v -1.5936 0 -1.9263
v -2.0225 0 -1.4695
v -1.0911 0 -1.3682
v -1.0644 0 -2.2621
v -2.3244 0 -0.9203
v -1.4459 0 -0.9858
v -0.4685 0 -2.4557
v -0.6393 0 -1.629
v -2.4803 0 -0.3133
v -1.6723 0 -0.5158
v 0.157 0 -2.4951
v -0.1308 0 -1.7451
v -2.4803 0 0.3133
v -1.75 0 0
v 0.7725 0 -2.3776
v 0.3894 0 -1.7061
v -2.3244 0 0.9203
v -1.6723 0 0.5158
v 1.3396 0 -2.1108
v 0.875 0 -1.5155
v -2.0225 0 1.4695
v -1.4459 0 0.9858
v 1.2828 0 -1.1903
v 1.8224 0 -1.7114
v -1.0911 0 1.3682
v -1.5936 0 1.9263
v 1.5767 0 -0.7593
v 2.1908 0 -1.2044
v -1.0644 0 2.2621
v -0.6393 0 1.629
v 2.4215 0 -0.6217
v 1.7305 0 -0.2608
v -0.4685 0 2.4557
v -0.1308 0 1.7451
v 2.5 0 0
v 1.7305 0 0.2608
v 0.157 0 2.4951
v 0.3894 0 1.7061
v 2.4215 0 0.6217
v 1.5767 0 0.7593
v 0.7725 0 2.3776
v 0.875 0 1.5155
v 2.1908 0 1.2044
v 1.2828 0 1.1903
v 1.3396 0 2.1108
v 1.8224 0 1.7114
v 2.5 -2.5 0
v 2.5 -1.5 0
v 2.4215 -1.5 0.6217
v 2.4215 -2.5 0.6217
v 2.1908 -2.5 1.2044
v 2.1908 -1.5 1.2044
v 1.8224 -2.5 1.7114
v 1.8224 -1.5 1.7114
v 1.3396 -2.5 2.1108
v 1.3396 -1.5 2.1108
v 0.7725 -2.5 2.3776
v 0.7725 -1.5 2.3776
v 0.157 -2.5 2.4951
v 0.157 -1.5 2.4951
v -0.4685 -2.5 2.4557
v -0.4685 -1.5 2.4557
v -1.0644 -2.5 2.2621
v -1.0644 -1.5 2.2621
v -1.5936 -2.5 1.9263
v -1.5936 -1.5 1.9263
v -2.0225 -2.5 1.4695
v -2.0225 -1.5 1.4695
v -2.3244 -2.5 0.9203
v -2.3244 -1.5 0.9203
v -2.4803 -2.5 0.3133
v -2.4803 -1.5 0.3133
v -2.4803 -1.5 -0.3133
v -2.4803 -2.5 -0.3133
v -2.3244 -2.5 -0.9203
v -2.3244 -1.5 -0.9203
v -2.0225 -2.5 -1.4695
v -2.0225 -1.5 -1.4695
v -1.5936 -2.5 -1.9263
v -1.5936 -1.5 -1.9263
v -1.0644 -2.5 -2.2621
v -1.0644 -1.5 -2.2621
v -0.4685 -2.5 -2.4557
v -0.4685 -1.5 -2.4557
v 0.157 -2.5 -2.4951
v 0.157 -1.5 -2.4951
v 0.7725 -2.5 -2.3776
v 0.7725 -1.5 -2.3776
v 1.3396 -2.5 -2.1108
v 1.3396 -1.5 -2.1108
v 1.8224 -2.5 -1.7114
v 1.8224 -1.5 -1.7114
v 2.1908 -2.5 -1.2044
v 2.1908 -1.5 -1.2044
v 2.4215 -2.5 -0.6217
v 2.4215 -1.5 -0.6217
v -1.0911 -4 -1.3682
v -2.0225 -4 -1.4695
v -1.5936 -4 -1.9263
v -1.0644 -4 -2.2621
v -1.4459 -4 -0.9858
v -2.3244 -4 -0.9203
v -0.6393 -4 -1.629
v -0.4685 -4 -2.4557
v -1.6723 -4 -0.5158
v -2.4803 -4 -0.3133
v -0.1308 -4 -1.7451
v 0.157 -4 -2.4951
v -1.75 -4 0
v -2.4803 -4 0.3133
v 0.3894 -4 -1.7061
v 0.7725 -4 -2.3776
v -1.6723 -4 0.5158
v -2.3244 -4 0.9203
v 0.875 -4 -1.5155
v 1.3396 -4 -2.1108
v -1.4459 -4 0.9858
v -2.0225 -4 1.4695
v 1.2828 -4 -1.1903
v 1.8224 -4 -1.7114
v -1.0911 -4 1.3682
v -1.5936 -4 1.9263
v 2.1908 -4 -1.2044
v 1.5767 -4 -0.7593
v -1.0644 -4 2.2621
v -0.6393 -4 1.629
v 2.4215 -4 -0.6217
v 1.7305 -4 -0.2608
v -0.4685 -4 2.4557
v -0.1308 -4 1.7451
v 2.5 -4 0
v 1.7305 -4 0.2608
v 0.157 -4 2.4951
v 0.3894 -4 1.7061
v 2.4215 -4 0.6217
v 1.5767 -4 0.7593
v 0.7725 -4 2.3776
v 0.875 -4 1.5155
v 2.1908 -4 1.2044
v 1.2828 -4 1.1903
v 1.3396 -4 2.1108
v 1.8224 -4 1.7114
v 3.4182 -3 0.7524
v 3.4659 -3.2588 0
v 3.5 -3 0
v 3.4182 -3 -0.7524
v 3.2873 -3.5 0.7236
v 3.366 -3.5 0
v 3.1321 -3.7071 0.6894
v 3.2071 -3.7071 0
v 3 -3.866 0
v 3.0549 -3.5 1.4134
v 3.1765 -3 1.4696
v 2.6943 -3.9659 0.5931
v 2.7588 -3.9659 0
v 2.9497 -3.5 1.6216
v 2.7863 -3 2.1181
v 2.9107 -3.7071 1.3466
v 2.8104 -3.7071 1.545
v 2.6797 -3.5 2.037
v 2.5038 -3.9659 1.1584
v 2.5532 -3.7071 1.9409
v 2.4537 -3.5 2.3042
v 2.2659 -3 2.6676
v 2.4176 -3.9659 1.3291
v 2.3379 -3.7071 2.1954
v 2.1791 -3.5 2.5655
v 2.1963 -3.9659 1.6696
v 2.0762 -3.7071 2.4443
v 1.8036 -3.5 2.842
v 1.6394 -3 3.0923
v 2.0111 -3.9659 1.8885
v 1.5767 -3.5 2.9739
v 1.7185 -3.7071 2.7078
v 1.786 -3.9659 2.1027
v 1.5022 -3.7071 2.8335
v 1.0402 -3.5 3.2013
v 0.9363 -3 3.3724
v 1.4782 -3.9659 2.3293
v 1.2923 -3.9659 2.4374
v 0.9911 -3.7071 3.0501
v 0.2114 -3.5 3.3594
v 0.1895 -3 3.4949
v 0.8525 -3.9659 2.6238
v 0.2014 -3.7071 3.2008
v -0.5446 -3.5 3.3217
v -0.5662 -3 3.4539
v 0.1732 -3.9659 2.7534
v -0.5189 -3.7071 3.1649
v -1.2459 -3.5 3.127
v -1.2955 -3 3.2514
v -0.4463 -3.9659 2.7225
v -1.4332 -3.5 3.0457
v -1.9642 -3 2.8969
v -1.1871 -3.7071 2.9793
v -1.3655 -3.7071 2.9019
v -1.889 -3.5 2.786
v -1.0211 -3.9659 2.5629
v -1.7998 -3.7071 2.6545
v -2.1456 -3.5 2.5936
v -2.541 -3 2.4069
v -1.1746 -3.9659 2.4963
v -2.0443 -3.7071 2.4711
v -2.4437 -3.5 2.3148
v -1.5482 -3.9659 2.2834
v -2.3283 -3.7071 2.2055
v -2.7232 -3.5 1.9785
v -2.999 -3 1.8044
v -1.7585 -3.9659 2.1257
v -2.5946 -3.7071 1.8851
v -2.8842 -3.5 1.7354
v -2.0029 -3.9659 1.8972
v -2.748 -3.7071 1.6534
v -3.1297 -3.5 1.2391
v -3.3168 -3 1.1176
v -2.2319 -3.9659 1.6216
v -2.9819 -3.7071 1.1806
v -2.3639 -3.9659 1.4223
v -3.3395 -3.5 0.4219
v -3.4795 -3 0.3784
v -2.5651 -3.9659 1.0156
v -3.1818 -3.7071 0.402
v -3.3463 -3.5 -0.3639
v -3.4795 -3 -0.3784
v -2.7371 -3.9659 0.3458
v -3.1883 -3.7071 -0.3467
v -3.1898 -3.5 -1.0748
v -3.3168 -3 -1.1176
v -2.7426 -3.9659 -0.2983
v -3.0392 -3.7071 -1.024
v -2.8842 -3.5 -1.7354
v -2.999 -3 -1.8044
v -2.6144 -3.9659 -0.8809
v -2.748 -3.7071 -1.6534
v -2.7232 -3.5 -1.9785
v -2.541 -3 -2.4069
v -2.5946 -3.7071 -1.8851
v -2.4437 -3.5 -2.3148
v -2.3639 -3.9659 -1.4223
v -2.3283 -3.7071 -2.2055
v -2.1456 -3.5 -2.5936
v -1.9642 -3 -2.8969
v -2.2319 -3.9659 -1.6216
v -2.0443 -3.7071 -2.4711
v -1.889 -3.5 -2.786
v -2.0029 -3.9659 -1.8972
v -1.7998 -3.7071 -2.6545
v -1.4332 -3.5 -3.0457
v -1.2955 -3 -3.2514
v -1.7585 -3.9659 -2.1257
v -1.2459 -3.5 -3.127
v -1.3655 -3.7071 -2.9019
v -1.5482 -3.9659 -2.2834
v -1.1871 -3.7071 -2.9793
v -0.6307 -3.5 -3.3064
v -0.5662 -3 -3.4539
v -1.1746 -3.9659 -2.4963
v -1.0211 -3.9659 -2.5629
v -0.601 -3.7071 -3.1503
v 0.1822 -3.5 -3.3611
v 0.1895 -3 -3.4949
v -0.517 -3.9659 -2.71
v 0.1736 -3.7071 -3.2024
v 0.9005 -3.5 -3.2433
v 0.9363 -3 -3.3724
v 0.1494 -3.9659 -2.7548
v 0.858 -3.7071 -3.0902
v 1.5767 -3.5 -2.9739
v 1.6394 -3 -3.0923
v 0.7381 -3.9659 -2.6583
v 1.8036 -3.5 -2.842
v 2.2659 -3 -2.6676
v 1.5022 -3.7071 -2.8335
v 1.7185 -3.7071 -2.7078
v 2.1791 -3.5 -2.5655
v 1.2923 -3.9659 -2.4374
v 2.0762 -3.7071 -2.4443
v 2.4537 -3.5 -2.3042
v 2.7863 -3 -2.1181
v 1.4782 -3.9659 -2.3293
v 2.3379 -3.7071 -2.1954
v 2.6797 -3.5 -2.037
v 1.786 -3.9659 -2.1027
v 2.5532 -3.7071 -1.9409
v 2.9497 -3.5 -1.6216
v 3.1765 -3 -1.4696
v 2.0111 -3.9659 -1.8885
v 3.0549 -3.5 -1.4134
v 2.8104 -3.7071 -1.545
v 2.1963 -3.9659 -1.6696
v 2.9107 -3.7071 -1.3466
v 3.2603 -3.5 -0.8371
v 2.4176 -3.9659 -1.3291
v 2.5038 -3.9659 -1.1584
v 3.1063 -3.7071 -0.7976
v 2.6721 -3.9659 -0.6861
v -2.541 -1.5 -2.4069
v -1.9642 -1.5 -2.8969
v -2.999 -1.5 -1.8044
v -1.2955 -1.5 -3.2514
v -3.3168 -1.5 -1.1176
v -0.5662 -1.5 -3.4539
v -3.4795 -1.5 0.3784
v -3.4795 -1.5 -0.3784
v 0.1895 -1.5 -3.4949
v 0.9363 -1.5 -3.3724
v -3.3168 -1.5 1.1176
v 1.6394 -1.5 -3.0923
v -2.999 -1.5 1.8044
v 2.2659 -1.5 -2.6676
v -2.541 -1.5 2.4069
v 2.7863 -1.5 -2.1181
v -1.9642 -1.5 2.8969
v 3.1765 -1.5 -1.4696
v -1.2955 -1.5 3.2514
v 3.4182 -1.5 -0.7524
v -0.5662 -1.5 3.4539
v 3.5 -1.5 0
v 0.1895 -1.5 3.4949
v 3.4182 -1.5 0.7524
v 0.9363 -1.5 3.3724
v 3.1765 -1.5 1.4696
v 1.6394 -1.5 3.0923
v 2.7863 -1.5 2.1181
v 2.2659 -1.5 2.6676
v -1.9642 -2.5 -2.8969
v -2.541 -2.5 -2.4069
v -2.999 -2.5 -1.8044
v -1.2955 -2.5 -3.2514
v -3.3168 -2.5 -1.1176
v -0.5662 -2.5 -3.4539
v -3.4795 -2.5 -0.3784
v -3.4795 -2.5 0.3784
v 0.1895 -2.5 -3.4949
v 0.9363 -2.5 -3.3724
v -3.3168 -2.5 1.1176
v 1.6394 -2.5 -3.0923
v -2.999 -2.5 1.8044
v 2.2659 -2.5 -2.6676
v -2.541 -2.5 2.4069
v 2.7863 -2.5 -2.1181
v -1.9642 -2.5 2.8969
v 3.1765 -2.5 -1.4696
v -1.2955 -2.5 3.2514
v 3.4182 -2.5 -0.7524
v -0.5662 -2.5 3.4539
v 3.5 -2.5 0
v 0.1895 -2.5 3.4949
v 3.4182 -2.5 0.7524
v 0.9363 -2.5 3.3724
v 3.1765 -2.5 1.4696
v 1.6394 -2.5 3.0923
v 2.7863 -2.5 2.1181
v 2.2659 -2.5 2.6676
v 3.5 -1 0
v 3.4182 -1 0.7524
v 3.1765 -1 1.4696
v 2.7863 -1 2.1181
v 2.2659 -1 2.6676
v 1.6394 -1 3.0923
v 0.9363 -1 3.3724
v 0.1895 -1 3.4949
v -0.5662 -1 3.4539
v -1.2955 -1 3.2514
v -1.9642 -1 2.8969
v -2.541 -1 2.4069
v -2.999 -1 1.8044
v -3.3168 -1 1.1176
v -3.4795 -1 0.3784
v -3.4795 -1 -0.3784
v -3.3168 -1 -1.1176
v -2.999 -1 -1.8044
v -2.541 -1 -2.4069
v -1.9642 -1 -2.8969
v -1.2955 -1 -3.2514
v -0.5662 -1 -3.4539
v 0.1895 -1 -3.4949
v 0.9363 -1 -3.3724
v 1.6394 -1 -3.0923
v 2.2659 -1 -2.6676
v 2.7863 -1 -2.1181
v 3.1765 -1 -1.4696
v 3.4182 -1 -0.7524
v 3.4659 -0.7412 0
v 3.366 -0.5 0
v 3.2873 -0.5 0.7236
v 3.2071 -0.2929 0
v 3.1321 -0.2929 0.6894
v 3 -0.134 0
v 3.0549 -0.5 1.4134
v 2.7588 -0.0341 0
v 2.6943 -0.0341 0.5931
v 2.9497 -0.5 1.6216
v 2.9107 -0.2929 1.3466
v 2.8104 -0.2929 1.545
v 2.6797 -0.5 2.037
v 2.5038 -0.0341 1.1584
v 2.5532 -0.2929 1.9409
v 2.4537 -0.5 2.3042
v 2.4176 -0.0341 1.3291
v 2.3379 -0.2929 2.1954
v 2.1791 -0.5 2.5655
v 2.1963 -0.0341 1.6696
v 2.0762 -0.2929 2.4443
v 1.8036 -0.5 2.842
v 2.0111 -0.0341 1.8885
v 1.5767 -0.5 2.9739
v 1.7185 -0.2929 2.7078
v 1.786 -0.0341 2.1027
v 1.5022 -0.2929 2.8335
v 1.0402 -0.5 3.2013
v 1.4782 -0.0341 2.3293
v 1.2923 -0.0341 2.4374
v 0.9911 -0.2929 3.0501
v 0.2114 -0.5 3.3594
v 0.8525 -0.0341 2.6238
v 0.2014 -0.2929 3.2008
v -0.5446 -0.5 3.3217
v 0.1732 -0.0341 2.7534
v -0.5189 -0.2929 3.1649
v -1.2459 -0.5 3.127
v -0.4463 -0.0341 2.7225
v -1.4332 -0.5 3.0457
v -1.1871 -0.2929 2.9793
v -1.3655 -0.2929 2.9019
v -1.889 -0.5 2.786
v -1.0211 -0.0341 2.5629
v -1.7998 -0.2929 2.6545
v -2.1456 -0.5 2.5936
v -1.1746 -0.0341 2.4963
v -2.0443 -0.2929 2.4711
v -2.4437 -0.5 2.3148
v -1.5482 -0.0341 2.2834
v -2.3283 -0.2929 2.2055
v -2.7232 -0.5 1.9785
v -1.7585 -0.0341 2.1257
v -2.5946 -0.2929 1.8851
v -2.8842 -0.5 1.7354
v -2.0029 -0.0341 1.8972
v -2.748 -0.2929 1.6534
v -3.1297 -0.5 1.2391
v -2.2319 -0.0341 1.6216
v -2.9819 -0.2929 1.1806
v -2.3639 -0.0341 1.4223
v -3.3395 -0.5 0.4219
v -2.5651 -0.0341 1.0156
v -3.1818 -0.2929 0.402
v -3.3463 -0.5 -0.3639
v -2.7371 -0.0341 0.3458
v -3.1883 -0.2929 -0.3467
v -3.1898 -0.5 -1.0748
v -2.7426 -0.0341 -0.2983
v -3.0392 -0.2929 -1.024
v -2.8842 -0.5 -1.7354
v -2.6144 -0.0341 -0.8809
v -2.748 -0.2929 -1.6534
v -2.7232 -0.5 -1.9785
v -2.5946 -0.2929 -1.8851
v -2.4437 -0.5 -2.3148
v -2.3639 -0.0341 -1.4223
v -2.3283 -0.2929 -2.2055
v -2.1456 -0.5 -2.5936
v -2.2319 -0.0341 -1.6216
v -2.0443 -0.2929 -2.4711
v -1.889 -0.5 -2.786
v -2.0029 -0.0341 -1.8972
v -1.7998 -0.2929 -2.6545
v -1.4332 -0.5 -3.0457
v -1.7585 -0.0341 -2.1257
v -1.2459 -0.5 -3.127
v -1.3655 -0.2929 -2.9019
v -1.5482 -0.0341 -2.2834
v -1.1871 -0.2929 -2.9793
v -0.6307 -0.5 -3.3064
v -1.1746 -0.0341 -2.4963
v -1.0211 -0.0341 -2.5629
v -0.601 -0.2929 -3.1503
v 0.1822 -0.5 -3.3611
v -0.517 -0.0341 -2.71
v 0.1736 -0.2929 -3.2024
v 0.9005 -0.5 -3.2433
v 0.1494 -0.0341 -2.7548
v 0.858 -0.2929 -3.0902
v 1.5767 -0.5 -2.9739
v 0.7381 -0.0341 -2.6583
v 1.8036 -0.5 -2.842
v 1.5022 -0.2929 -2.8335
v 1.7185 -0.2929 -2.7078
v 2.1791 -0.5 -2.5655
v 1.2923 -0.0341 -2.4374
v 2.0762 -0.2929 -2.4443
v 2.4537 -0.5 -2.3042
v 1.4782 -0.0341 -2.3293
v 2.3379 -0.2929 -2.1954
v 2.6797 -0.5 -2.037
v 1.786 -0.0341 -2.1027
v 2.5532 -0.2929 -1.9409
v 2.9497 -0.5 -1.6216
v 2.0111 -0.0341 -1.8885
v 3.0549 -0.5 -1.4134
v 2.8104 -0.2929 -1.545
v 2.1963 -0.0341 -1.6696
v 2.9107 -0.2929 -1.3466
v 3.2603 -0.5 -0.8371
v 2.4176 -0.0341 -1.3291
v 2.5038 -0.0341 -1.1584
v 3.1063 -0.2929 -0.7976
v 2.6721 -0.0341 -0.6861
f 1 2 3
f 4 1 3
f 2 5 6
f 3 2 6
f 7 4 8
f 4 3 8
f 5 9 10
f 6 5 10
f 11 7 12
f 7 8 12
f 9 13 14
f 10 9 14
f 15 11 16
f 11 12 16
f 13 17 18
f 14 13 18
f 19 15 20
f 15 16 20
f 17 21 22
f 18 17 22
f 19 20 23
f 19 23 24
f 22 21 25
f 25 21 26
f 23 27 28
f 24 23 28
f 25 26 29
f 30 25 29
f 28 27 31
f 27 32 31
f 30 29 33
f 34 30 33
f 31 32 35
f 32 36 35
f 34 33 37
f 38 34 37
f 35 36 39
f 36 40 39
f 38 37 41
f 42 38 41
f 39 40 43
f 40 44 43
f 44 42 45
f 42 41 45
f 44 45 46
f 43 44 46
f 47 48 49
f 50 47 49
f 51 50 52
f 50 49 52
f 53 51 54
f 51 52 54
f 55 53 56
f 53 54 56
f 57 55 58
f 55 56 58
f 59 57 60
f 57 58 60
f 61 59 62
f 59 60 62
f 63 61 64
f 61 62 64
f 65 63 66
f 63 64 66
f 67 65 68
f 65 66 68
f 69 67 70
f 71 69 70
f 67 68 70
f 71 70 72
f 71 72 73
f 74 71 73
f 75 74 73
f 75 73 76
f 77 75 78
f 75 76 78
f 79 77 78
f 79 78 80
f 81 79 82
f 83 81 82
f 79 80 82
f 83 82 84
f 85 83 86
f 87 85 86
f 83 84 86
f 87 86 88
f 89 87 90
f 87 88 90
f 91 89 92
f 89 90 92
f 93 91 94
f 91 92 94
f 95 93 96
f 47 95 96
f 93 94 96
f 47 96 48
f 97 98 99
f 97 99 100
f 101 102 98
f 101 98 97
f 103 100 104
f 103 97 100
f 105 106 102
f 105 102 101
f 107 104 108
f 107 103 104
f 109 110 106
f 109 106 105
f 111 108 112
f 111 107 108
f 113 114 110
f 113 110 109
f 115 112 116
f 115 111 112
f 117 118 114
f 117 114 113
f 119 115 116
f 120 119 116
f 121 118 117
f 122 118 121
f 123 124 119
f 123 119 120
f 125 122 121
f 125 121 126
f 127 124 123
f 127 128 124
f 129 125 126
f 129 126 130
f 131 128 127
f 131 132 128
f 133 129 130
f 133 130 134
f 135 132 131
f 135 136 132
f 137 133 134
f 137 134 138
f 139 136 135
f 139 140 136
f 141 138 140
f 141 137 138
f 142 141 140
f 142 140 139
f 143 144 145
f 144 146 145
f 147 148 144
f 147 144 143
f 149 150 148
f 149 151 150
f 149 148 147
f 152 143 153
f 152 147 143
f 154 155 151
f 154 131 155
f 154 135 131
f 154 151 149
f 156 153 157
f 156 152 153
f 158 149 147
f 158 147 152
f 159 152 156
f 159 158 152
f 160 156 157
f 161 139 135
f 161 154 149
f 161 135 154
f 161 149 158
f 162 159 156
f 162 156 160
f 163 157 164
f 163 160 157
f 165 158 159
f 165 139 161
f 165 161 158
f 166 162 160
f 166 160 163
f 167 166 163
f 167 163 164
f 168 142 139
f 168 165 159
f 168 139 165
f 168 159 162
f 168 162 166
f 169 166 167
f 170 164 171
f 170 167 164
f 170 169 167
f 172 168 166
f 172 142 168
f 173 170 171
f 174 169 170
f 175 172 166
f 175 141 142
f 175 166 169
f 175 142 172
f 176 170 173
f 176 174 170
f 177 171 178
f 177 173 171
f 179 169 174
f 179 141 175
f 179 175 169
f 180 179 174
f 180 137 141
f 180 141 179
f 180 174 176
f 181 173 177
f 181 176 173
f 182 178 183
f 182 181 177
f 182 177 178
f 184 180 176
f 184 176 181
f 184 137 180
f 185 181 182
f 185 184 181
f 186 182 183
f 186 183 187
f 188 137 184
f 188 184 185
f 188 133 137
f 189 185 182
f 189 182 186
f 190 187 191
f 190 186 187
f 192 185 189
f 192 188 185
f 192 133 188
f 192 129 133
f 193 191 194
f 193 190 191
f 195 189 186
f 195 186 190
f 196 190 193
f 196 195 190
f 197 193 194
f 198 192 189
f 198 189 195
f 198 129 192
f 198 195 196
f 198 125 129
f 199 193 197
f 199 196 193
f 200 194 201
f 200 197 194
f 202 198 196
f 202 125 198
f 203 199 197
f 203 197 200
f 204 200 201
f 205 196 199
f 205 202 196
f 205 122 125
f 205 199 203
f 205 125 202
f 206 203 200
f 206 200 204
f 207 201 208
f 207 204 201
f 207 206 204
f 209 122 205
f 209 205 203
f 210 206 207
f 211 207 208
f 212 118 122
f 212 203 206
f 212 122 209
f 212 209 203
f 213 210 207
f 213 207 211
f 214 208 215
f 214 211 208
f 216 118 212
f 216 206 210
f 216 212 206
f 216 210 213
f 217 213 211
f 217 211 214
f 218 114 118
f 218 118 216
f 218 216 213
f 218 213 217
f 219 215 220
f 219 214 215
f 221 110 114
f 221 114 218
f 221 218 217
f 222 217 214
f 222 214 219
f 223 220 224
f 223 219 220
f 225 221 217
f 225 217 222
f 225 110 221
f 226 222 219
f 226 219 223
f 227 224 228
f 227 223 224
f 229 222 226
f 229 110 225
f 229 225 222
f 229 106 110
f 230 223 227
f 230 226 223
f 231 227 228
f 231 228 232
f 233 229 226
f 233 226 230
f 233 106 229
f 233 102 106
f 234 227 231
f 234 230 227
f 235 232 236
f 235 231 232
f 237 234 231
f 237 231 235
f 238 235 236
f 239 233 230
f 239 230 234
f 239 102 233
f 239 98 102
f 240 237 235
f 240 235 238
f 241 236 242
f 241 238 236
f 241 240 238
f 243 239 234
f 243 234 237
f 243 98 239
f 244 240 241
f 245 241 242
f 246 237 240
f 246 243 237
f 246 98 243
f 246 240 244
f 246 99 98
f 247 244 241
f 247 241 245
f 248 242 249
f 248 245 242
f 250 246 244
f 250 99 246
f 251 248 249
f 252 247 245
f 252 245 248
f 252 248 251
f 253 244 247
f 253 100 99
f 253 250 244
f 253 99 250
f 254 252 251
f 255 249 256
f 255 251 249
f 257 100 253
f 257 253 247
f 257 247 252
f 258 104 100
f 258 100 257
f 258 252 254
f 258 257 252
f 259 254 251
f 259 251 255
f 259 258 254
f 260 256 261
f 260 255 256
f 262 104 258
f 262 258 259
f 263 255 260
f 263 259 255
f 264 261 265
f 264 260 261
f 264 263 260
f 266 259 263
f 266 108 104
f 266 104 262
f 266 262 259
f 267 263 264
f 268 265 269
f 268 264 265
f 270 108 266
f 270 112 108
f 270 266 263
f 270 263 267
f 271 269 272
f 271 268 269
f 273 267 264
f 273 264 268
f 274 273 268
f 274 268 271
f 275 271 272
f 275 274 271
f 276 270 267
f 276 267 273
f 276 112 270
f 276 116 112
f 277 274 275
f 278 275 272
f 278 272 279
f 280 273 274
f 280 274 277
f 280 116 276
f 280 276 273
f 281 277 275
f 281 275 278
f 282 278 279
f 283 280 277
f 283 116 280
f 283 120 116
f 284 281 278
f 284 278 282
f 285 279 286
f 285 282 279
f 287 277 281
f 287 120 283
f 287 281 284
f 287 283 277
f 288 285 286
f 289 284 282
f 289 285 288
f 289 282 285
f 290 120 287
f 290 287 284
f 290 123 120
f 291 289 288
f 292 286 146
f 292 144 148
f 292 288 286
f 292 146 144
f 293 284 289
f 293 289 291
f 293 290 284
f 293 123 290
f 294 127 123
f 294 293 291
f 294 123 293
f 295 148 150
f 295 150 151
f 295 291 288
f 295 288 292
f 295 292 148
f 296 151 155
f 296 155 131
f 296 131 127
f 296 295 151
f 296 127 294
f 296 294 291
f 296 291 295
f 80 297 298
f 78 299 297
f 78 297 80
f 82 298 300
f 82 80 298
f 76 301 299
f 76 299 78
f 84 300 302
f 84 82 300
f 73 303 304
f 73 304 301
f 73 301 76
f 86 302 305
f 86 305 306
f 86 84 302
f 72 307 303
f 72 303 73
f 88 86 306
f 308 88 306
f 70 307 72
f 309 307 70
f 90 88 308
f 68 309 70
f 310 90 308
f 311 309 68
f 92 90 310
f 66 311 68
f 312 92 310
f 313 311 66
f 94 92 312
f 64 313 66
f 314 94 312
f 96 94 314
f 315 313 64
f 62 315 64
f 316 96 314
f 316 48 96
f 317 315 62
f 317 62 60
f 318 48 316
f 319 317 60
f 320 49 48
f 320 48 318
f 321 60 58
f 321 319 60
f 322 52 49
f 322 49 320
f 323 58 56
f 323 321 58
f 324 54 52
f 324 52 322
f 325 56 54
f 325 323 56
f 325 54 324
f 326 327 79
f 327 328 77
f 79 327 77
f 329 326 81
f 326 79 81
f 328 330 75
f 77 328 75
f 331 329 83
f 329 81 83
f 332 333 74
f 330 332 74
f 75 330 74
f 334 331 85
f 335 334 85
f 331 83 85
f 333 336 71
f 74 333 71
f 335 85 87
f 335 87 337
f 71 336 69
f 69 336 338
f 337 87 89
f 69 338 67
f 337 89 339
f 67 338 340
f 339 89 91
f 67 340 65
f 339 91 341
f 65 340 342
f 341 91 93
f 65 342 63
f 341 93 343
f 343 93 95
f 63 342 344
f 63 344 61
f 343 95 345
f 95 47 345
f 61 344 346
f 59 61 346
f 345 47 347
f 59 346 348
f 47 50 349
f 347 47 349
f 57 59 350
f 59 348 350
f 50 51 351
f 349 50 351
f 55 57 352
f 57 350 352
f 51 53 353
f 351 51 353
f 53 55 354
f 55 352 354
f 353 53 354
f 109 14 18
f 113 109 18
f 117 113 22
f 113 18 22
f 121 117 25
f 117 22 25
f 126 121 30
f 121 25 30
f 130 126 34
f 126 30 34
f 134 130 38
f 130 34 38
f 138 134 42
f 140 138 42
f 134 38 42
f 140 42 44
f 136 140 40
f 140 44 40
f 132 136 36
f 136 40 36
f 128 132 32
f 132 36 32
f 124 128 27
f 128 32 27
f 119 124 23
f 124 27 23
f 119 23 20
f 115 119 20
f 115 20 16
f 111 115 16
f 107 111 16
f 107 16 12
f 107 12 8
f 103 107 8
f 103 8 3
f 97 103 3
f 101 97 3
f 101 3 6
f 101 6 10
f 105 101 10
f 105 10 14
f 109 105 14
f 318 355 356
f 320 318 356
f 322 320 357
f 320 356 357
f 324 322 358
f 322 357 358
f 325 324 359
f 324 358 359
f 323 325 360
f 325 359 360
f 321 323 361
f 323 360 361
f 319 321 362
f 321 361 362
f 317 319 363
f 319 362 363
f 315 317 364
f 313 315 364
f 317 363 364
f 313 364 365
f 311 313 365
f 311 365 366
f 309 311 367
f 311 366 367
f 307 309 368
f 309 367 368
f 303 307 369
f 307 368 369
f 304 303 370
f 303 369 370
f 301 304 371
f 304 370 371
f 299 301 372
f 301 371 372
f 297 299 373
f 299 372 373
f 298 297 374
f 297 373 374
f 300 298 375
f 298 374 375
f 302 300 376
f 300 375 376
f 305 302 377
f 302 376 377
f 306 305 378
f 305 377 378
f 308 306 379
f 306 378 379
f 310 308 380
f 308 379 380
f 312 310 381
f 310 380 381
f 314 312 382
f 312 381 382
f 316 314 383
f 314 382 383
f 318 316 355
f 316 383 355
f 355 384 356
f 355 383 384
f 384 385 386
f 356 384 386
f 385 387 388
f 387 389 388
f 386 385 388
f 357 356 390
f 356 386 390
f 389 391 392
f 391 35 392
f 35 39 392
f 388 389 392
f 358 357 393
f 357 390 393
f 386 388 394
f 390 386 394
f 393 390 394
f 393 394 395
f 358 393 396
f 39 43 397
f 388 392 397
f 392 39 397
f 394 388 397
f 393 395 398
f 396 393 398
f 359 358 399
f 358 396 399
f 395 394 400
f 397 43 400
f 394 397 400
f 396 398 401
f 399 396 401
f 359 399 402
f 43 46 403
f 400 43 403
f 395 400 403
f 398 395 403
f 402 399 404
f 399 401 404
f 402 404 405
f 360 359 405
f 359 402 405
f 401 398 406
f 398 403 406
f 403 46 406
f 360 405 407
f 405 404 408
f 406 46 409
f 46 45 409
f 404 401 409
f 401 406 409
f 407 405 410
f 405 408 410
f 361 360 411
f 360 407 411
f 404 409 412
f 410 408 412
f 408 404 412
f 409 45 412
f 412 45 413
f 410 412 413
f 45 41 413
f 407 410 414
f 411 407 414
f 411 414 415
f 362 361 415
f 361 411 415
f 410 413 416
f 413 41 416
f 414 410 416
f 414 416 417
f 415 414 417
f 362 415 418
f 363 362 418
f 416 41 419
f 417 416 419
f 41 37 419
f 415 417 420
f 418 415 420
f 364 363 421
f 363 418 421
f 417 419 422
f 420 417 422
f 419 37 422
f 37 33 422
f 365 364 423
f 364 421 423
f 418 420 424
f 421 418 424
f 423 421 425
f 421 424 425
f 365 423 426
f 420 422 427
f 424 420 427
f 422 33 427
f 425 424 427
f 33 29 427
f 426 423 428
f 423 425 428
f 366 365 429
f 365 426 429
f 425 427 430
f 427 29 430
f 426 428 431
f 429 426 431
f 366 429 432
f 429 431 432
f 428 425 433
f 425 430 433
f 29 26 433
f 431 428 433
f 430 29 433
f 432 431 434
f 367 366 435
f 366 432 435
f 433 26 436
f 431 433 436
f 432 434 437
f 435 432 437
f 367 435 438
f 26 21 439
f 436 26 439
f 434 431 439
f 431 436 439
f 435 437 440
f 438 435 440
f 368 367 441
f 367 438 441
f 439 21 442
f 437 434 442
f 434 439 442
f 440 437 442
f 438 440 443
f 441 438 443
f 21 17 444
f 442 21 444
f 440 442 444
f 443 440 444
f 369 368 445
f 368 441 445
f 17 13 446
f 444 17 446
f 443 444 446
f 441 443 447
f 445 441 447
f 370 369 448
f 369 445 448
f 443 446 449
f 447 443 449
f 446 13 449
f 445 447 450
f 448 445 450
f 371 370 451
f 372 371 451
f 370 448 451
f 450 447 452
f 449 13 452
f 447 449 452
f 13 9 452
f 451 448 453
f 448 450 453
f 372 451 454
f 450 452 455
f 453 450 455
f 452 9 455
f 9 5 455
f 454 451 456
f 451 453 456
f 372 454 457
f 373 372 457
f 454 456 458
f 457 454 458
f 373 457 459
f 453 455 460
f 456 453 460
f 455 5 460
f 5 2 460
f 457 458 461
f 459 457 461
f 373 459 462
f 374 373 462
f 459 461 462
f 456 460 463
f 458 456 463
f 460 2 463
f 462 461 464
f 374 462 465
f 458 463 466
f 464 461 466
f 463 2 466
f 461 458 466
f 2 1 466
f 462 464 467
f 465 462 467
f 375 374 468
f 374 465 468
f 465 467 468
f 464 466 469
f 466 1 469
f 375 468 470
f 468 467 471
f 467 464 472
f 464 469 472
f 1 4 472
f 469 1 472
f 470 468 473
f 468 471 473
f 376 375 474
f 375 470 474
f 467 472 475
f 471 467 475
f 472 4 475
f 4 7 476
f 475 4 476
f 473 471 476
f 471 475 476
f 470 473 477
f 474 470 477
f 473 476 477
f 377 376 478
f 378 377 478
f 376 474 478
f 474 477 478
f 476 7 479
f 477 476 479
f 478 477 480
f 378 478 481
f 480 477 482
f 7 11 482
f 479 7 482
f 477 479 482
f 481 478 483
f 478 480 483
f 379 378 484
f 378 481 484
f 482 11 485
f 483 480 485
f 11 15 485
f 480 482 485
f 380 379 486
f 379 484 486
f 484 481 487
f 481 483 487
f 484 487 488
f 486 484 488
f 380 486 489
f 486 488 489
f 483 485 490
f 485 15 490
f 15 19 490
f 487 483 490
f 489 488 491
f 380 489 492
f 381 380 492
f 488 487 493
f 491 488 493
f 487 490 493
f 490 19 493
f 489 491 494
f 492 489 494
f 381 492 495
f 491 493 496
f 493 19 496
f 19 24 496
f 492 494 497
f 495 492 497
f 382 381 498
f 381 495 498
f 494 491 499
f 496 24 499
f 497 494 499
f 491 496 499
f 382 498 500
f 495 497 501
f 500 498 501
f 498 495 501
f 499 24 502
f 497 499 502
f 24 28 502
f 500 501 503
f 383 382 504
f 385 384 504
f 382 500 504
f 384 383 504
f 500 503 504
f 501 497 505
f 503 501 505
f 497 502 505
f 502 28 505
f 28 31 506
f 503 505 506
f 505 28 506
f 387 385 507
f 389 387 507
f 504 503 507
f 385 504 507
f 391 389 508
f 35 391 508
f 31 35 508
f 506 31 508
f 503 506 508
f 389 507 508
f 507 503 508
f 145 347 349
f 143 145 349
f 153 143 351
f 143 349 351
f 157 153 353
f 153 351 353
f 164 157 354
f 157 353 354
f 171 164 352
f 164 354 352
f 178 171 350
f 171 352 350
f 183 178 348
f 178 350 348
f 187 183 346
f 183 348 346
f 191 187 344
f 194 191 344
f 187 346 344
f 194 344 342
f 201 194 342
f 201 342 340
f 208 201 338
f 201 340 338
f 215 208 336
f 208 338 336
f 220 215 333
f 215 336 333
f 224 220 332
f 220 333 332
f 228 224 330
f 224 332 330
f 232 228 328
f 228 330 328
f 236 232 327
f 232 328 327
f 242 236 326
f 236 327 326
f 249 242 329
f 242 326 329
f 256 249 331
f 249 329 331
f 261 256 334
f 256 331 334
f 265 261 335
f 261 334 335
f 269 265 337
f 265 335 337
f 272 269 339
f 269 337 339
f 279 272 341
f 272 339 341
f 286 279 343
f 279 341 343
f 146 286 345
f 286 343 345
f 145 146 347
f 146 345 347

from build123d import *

# Parameters (mm, degrees)
F0_R      = 3.5
F1_DEPTH  = 1.5
F2_R      = 2.5
F3_DEPTH  = 1
F4_R      = 3.5
F4_R_2    = 2.5
F5_DEPTH  = 1.5
F6_R      = 1
F7_R      = 1
F10_R     = 3.5
F11_DEPTH = 1.5
F12_R     = 1
F13_D     = 3.5


with BuildPart() as f1:
    # F0 (on Front) → F1 (new body)
    with BuildSketch(Plane.XZ):
        Circle(F0_R)
    extrude(amount=F1_DEPTH)

    # F2 (on face) → F3 (join)
    with BuildSketch(Plane.XZ.offset(1.5)):
        Circle(F2_R)
    extrude(amount=F3_DEPTH)

    # F7
    f7_edges = [f1.edges().sort_by_distance(p)[0] for p in [
        (-3.5, 0, 0),
    ]]
    fillet(f7_edges, radius=F7_R)

    # F10 (on face) → F11 (join)
    with BuildSketch(Plane.XZ.offset(2.5)):
        Circle(F10_R)
    extrude(amount=F11_DEPTH)

    # F12
    f12_edges = [f1.edges().sort_by_distance(p)[0] for p in [
        (-3.5, -4, 0),
    ]]
    fillet(f12_edges, radius=F12_R)

    # F13 (through all)
    with Locations(Plane.XZ.offset(4)):
        with Locations((0, 0)):
            Hole(F13_D / 2)


with BuildPart() as f5:
    # F4 (on face) → F5 (new body)
    with BuildSketch(Plane.XZ.offset(2.5)):
        Circle(F4_R)
        Circle(F4_R_2, mode=Mode.SUBTRACT)
        Circle(F4_R_2)
    extrude(amount=F5_DEPTH)

    # F6
    f6_edges = [f5.edges().sort_by_distance(p)[0] for p in [
        (-3.5, -4, 0),
    ]]
    fillet(f6_edges, radius=F6_R)


solid = f1.part
